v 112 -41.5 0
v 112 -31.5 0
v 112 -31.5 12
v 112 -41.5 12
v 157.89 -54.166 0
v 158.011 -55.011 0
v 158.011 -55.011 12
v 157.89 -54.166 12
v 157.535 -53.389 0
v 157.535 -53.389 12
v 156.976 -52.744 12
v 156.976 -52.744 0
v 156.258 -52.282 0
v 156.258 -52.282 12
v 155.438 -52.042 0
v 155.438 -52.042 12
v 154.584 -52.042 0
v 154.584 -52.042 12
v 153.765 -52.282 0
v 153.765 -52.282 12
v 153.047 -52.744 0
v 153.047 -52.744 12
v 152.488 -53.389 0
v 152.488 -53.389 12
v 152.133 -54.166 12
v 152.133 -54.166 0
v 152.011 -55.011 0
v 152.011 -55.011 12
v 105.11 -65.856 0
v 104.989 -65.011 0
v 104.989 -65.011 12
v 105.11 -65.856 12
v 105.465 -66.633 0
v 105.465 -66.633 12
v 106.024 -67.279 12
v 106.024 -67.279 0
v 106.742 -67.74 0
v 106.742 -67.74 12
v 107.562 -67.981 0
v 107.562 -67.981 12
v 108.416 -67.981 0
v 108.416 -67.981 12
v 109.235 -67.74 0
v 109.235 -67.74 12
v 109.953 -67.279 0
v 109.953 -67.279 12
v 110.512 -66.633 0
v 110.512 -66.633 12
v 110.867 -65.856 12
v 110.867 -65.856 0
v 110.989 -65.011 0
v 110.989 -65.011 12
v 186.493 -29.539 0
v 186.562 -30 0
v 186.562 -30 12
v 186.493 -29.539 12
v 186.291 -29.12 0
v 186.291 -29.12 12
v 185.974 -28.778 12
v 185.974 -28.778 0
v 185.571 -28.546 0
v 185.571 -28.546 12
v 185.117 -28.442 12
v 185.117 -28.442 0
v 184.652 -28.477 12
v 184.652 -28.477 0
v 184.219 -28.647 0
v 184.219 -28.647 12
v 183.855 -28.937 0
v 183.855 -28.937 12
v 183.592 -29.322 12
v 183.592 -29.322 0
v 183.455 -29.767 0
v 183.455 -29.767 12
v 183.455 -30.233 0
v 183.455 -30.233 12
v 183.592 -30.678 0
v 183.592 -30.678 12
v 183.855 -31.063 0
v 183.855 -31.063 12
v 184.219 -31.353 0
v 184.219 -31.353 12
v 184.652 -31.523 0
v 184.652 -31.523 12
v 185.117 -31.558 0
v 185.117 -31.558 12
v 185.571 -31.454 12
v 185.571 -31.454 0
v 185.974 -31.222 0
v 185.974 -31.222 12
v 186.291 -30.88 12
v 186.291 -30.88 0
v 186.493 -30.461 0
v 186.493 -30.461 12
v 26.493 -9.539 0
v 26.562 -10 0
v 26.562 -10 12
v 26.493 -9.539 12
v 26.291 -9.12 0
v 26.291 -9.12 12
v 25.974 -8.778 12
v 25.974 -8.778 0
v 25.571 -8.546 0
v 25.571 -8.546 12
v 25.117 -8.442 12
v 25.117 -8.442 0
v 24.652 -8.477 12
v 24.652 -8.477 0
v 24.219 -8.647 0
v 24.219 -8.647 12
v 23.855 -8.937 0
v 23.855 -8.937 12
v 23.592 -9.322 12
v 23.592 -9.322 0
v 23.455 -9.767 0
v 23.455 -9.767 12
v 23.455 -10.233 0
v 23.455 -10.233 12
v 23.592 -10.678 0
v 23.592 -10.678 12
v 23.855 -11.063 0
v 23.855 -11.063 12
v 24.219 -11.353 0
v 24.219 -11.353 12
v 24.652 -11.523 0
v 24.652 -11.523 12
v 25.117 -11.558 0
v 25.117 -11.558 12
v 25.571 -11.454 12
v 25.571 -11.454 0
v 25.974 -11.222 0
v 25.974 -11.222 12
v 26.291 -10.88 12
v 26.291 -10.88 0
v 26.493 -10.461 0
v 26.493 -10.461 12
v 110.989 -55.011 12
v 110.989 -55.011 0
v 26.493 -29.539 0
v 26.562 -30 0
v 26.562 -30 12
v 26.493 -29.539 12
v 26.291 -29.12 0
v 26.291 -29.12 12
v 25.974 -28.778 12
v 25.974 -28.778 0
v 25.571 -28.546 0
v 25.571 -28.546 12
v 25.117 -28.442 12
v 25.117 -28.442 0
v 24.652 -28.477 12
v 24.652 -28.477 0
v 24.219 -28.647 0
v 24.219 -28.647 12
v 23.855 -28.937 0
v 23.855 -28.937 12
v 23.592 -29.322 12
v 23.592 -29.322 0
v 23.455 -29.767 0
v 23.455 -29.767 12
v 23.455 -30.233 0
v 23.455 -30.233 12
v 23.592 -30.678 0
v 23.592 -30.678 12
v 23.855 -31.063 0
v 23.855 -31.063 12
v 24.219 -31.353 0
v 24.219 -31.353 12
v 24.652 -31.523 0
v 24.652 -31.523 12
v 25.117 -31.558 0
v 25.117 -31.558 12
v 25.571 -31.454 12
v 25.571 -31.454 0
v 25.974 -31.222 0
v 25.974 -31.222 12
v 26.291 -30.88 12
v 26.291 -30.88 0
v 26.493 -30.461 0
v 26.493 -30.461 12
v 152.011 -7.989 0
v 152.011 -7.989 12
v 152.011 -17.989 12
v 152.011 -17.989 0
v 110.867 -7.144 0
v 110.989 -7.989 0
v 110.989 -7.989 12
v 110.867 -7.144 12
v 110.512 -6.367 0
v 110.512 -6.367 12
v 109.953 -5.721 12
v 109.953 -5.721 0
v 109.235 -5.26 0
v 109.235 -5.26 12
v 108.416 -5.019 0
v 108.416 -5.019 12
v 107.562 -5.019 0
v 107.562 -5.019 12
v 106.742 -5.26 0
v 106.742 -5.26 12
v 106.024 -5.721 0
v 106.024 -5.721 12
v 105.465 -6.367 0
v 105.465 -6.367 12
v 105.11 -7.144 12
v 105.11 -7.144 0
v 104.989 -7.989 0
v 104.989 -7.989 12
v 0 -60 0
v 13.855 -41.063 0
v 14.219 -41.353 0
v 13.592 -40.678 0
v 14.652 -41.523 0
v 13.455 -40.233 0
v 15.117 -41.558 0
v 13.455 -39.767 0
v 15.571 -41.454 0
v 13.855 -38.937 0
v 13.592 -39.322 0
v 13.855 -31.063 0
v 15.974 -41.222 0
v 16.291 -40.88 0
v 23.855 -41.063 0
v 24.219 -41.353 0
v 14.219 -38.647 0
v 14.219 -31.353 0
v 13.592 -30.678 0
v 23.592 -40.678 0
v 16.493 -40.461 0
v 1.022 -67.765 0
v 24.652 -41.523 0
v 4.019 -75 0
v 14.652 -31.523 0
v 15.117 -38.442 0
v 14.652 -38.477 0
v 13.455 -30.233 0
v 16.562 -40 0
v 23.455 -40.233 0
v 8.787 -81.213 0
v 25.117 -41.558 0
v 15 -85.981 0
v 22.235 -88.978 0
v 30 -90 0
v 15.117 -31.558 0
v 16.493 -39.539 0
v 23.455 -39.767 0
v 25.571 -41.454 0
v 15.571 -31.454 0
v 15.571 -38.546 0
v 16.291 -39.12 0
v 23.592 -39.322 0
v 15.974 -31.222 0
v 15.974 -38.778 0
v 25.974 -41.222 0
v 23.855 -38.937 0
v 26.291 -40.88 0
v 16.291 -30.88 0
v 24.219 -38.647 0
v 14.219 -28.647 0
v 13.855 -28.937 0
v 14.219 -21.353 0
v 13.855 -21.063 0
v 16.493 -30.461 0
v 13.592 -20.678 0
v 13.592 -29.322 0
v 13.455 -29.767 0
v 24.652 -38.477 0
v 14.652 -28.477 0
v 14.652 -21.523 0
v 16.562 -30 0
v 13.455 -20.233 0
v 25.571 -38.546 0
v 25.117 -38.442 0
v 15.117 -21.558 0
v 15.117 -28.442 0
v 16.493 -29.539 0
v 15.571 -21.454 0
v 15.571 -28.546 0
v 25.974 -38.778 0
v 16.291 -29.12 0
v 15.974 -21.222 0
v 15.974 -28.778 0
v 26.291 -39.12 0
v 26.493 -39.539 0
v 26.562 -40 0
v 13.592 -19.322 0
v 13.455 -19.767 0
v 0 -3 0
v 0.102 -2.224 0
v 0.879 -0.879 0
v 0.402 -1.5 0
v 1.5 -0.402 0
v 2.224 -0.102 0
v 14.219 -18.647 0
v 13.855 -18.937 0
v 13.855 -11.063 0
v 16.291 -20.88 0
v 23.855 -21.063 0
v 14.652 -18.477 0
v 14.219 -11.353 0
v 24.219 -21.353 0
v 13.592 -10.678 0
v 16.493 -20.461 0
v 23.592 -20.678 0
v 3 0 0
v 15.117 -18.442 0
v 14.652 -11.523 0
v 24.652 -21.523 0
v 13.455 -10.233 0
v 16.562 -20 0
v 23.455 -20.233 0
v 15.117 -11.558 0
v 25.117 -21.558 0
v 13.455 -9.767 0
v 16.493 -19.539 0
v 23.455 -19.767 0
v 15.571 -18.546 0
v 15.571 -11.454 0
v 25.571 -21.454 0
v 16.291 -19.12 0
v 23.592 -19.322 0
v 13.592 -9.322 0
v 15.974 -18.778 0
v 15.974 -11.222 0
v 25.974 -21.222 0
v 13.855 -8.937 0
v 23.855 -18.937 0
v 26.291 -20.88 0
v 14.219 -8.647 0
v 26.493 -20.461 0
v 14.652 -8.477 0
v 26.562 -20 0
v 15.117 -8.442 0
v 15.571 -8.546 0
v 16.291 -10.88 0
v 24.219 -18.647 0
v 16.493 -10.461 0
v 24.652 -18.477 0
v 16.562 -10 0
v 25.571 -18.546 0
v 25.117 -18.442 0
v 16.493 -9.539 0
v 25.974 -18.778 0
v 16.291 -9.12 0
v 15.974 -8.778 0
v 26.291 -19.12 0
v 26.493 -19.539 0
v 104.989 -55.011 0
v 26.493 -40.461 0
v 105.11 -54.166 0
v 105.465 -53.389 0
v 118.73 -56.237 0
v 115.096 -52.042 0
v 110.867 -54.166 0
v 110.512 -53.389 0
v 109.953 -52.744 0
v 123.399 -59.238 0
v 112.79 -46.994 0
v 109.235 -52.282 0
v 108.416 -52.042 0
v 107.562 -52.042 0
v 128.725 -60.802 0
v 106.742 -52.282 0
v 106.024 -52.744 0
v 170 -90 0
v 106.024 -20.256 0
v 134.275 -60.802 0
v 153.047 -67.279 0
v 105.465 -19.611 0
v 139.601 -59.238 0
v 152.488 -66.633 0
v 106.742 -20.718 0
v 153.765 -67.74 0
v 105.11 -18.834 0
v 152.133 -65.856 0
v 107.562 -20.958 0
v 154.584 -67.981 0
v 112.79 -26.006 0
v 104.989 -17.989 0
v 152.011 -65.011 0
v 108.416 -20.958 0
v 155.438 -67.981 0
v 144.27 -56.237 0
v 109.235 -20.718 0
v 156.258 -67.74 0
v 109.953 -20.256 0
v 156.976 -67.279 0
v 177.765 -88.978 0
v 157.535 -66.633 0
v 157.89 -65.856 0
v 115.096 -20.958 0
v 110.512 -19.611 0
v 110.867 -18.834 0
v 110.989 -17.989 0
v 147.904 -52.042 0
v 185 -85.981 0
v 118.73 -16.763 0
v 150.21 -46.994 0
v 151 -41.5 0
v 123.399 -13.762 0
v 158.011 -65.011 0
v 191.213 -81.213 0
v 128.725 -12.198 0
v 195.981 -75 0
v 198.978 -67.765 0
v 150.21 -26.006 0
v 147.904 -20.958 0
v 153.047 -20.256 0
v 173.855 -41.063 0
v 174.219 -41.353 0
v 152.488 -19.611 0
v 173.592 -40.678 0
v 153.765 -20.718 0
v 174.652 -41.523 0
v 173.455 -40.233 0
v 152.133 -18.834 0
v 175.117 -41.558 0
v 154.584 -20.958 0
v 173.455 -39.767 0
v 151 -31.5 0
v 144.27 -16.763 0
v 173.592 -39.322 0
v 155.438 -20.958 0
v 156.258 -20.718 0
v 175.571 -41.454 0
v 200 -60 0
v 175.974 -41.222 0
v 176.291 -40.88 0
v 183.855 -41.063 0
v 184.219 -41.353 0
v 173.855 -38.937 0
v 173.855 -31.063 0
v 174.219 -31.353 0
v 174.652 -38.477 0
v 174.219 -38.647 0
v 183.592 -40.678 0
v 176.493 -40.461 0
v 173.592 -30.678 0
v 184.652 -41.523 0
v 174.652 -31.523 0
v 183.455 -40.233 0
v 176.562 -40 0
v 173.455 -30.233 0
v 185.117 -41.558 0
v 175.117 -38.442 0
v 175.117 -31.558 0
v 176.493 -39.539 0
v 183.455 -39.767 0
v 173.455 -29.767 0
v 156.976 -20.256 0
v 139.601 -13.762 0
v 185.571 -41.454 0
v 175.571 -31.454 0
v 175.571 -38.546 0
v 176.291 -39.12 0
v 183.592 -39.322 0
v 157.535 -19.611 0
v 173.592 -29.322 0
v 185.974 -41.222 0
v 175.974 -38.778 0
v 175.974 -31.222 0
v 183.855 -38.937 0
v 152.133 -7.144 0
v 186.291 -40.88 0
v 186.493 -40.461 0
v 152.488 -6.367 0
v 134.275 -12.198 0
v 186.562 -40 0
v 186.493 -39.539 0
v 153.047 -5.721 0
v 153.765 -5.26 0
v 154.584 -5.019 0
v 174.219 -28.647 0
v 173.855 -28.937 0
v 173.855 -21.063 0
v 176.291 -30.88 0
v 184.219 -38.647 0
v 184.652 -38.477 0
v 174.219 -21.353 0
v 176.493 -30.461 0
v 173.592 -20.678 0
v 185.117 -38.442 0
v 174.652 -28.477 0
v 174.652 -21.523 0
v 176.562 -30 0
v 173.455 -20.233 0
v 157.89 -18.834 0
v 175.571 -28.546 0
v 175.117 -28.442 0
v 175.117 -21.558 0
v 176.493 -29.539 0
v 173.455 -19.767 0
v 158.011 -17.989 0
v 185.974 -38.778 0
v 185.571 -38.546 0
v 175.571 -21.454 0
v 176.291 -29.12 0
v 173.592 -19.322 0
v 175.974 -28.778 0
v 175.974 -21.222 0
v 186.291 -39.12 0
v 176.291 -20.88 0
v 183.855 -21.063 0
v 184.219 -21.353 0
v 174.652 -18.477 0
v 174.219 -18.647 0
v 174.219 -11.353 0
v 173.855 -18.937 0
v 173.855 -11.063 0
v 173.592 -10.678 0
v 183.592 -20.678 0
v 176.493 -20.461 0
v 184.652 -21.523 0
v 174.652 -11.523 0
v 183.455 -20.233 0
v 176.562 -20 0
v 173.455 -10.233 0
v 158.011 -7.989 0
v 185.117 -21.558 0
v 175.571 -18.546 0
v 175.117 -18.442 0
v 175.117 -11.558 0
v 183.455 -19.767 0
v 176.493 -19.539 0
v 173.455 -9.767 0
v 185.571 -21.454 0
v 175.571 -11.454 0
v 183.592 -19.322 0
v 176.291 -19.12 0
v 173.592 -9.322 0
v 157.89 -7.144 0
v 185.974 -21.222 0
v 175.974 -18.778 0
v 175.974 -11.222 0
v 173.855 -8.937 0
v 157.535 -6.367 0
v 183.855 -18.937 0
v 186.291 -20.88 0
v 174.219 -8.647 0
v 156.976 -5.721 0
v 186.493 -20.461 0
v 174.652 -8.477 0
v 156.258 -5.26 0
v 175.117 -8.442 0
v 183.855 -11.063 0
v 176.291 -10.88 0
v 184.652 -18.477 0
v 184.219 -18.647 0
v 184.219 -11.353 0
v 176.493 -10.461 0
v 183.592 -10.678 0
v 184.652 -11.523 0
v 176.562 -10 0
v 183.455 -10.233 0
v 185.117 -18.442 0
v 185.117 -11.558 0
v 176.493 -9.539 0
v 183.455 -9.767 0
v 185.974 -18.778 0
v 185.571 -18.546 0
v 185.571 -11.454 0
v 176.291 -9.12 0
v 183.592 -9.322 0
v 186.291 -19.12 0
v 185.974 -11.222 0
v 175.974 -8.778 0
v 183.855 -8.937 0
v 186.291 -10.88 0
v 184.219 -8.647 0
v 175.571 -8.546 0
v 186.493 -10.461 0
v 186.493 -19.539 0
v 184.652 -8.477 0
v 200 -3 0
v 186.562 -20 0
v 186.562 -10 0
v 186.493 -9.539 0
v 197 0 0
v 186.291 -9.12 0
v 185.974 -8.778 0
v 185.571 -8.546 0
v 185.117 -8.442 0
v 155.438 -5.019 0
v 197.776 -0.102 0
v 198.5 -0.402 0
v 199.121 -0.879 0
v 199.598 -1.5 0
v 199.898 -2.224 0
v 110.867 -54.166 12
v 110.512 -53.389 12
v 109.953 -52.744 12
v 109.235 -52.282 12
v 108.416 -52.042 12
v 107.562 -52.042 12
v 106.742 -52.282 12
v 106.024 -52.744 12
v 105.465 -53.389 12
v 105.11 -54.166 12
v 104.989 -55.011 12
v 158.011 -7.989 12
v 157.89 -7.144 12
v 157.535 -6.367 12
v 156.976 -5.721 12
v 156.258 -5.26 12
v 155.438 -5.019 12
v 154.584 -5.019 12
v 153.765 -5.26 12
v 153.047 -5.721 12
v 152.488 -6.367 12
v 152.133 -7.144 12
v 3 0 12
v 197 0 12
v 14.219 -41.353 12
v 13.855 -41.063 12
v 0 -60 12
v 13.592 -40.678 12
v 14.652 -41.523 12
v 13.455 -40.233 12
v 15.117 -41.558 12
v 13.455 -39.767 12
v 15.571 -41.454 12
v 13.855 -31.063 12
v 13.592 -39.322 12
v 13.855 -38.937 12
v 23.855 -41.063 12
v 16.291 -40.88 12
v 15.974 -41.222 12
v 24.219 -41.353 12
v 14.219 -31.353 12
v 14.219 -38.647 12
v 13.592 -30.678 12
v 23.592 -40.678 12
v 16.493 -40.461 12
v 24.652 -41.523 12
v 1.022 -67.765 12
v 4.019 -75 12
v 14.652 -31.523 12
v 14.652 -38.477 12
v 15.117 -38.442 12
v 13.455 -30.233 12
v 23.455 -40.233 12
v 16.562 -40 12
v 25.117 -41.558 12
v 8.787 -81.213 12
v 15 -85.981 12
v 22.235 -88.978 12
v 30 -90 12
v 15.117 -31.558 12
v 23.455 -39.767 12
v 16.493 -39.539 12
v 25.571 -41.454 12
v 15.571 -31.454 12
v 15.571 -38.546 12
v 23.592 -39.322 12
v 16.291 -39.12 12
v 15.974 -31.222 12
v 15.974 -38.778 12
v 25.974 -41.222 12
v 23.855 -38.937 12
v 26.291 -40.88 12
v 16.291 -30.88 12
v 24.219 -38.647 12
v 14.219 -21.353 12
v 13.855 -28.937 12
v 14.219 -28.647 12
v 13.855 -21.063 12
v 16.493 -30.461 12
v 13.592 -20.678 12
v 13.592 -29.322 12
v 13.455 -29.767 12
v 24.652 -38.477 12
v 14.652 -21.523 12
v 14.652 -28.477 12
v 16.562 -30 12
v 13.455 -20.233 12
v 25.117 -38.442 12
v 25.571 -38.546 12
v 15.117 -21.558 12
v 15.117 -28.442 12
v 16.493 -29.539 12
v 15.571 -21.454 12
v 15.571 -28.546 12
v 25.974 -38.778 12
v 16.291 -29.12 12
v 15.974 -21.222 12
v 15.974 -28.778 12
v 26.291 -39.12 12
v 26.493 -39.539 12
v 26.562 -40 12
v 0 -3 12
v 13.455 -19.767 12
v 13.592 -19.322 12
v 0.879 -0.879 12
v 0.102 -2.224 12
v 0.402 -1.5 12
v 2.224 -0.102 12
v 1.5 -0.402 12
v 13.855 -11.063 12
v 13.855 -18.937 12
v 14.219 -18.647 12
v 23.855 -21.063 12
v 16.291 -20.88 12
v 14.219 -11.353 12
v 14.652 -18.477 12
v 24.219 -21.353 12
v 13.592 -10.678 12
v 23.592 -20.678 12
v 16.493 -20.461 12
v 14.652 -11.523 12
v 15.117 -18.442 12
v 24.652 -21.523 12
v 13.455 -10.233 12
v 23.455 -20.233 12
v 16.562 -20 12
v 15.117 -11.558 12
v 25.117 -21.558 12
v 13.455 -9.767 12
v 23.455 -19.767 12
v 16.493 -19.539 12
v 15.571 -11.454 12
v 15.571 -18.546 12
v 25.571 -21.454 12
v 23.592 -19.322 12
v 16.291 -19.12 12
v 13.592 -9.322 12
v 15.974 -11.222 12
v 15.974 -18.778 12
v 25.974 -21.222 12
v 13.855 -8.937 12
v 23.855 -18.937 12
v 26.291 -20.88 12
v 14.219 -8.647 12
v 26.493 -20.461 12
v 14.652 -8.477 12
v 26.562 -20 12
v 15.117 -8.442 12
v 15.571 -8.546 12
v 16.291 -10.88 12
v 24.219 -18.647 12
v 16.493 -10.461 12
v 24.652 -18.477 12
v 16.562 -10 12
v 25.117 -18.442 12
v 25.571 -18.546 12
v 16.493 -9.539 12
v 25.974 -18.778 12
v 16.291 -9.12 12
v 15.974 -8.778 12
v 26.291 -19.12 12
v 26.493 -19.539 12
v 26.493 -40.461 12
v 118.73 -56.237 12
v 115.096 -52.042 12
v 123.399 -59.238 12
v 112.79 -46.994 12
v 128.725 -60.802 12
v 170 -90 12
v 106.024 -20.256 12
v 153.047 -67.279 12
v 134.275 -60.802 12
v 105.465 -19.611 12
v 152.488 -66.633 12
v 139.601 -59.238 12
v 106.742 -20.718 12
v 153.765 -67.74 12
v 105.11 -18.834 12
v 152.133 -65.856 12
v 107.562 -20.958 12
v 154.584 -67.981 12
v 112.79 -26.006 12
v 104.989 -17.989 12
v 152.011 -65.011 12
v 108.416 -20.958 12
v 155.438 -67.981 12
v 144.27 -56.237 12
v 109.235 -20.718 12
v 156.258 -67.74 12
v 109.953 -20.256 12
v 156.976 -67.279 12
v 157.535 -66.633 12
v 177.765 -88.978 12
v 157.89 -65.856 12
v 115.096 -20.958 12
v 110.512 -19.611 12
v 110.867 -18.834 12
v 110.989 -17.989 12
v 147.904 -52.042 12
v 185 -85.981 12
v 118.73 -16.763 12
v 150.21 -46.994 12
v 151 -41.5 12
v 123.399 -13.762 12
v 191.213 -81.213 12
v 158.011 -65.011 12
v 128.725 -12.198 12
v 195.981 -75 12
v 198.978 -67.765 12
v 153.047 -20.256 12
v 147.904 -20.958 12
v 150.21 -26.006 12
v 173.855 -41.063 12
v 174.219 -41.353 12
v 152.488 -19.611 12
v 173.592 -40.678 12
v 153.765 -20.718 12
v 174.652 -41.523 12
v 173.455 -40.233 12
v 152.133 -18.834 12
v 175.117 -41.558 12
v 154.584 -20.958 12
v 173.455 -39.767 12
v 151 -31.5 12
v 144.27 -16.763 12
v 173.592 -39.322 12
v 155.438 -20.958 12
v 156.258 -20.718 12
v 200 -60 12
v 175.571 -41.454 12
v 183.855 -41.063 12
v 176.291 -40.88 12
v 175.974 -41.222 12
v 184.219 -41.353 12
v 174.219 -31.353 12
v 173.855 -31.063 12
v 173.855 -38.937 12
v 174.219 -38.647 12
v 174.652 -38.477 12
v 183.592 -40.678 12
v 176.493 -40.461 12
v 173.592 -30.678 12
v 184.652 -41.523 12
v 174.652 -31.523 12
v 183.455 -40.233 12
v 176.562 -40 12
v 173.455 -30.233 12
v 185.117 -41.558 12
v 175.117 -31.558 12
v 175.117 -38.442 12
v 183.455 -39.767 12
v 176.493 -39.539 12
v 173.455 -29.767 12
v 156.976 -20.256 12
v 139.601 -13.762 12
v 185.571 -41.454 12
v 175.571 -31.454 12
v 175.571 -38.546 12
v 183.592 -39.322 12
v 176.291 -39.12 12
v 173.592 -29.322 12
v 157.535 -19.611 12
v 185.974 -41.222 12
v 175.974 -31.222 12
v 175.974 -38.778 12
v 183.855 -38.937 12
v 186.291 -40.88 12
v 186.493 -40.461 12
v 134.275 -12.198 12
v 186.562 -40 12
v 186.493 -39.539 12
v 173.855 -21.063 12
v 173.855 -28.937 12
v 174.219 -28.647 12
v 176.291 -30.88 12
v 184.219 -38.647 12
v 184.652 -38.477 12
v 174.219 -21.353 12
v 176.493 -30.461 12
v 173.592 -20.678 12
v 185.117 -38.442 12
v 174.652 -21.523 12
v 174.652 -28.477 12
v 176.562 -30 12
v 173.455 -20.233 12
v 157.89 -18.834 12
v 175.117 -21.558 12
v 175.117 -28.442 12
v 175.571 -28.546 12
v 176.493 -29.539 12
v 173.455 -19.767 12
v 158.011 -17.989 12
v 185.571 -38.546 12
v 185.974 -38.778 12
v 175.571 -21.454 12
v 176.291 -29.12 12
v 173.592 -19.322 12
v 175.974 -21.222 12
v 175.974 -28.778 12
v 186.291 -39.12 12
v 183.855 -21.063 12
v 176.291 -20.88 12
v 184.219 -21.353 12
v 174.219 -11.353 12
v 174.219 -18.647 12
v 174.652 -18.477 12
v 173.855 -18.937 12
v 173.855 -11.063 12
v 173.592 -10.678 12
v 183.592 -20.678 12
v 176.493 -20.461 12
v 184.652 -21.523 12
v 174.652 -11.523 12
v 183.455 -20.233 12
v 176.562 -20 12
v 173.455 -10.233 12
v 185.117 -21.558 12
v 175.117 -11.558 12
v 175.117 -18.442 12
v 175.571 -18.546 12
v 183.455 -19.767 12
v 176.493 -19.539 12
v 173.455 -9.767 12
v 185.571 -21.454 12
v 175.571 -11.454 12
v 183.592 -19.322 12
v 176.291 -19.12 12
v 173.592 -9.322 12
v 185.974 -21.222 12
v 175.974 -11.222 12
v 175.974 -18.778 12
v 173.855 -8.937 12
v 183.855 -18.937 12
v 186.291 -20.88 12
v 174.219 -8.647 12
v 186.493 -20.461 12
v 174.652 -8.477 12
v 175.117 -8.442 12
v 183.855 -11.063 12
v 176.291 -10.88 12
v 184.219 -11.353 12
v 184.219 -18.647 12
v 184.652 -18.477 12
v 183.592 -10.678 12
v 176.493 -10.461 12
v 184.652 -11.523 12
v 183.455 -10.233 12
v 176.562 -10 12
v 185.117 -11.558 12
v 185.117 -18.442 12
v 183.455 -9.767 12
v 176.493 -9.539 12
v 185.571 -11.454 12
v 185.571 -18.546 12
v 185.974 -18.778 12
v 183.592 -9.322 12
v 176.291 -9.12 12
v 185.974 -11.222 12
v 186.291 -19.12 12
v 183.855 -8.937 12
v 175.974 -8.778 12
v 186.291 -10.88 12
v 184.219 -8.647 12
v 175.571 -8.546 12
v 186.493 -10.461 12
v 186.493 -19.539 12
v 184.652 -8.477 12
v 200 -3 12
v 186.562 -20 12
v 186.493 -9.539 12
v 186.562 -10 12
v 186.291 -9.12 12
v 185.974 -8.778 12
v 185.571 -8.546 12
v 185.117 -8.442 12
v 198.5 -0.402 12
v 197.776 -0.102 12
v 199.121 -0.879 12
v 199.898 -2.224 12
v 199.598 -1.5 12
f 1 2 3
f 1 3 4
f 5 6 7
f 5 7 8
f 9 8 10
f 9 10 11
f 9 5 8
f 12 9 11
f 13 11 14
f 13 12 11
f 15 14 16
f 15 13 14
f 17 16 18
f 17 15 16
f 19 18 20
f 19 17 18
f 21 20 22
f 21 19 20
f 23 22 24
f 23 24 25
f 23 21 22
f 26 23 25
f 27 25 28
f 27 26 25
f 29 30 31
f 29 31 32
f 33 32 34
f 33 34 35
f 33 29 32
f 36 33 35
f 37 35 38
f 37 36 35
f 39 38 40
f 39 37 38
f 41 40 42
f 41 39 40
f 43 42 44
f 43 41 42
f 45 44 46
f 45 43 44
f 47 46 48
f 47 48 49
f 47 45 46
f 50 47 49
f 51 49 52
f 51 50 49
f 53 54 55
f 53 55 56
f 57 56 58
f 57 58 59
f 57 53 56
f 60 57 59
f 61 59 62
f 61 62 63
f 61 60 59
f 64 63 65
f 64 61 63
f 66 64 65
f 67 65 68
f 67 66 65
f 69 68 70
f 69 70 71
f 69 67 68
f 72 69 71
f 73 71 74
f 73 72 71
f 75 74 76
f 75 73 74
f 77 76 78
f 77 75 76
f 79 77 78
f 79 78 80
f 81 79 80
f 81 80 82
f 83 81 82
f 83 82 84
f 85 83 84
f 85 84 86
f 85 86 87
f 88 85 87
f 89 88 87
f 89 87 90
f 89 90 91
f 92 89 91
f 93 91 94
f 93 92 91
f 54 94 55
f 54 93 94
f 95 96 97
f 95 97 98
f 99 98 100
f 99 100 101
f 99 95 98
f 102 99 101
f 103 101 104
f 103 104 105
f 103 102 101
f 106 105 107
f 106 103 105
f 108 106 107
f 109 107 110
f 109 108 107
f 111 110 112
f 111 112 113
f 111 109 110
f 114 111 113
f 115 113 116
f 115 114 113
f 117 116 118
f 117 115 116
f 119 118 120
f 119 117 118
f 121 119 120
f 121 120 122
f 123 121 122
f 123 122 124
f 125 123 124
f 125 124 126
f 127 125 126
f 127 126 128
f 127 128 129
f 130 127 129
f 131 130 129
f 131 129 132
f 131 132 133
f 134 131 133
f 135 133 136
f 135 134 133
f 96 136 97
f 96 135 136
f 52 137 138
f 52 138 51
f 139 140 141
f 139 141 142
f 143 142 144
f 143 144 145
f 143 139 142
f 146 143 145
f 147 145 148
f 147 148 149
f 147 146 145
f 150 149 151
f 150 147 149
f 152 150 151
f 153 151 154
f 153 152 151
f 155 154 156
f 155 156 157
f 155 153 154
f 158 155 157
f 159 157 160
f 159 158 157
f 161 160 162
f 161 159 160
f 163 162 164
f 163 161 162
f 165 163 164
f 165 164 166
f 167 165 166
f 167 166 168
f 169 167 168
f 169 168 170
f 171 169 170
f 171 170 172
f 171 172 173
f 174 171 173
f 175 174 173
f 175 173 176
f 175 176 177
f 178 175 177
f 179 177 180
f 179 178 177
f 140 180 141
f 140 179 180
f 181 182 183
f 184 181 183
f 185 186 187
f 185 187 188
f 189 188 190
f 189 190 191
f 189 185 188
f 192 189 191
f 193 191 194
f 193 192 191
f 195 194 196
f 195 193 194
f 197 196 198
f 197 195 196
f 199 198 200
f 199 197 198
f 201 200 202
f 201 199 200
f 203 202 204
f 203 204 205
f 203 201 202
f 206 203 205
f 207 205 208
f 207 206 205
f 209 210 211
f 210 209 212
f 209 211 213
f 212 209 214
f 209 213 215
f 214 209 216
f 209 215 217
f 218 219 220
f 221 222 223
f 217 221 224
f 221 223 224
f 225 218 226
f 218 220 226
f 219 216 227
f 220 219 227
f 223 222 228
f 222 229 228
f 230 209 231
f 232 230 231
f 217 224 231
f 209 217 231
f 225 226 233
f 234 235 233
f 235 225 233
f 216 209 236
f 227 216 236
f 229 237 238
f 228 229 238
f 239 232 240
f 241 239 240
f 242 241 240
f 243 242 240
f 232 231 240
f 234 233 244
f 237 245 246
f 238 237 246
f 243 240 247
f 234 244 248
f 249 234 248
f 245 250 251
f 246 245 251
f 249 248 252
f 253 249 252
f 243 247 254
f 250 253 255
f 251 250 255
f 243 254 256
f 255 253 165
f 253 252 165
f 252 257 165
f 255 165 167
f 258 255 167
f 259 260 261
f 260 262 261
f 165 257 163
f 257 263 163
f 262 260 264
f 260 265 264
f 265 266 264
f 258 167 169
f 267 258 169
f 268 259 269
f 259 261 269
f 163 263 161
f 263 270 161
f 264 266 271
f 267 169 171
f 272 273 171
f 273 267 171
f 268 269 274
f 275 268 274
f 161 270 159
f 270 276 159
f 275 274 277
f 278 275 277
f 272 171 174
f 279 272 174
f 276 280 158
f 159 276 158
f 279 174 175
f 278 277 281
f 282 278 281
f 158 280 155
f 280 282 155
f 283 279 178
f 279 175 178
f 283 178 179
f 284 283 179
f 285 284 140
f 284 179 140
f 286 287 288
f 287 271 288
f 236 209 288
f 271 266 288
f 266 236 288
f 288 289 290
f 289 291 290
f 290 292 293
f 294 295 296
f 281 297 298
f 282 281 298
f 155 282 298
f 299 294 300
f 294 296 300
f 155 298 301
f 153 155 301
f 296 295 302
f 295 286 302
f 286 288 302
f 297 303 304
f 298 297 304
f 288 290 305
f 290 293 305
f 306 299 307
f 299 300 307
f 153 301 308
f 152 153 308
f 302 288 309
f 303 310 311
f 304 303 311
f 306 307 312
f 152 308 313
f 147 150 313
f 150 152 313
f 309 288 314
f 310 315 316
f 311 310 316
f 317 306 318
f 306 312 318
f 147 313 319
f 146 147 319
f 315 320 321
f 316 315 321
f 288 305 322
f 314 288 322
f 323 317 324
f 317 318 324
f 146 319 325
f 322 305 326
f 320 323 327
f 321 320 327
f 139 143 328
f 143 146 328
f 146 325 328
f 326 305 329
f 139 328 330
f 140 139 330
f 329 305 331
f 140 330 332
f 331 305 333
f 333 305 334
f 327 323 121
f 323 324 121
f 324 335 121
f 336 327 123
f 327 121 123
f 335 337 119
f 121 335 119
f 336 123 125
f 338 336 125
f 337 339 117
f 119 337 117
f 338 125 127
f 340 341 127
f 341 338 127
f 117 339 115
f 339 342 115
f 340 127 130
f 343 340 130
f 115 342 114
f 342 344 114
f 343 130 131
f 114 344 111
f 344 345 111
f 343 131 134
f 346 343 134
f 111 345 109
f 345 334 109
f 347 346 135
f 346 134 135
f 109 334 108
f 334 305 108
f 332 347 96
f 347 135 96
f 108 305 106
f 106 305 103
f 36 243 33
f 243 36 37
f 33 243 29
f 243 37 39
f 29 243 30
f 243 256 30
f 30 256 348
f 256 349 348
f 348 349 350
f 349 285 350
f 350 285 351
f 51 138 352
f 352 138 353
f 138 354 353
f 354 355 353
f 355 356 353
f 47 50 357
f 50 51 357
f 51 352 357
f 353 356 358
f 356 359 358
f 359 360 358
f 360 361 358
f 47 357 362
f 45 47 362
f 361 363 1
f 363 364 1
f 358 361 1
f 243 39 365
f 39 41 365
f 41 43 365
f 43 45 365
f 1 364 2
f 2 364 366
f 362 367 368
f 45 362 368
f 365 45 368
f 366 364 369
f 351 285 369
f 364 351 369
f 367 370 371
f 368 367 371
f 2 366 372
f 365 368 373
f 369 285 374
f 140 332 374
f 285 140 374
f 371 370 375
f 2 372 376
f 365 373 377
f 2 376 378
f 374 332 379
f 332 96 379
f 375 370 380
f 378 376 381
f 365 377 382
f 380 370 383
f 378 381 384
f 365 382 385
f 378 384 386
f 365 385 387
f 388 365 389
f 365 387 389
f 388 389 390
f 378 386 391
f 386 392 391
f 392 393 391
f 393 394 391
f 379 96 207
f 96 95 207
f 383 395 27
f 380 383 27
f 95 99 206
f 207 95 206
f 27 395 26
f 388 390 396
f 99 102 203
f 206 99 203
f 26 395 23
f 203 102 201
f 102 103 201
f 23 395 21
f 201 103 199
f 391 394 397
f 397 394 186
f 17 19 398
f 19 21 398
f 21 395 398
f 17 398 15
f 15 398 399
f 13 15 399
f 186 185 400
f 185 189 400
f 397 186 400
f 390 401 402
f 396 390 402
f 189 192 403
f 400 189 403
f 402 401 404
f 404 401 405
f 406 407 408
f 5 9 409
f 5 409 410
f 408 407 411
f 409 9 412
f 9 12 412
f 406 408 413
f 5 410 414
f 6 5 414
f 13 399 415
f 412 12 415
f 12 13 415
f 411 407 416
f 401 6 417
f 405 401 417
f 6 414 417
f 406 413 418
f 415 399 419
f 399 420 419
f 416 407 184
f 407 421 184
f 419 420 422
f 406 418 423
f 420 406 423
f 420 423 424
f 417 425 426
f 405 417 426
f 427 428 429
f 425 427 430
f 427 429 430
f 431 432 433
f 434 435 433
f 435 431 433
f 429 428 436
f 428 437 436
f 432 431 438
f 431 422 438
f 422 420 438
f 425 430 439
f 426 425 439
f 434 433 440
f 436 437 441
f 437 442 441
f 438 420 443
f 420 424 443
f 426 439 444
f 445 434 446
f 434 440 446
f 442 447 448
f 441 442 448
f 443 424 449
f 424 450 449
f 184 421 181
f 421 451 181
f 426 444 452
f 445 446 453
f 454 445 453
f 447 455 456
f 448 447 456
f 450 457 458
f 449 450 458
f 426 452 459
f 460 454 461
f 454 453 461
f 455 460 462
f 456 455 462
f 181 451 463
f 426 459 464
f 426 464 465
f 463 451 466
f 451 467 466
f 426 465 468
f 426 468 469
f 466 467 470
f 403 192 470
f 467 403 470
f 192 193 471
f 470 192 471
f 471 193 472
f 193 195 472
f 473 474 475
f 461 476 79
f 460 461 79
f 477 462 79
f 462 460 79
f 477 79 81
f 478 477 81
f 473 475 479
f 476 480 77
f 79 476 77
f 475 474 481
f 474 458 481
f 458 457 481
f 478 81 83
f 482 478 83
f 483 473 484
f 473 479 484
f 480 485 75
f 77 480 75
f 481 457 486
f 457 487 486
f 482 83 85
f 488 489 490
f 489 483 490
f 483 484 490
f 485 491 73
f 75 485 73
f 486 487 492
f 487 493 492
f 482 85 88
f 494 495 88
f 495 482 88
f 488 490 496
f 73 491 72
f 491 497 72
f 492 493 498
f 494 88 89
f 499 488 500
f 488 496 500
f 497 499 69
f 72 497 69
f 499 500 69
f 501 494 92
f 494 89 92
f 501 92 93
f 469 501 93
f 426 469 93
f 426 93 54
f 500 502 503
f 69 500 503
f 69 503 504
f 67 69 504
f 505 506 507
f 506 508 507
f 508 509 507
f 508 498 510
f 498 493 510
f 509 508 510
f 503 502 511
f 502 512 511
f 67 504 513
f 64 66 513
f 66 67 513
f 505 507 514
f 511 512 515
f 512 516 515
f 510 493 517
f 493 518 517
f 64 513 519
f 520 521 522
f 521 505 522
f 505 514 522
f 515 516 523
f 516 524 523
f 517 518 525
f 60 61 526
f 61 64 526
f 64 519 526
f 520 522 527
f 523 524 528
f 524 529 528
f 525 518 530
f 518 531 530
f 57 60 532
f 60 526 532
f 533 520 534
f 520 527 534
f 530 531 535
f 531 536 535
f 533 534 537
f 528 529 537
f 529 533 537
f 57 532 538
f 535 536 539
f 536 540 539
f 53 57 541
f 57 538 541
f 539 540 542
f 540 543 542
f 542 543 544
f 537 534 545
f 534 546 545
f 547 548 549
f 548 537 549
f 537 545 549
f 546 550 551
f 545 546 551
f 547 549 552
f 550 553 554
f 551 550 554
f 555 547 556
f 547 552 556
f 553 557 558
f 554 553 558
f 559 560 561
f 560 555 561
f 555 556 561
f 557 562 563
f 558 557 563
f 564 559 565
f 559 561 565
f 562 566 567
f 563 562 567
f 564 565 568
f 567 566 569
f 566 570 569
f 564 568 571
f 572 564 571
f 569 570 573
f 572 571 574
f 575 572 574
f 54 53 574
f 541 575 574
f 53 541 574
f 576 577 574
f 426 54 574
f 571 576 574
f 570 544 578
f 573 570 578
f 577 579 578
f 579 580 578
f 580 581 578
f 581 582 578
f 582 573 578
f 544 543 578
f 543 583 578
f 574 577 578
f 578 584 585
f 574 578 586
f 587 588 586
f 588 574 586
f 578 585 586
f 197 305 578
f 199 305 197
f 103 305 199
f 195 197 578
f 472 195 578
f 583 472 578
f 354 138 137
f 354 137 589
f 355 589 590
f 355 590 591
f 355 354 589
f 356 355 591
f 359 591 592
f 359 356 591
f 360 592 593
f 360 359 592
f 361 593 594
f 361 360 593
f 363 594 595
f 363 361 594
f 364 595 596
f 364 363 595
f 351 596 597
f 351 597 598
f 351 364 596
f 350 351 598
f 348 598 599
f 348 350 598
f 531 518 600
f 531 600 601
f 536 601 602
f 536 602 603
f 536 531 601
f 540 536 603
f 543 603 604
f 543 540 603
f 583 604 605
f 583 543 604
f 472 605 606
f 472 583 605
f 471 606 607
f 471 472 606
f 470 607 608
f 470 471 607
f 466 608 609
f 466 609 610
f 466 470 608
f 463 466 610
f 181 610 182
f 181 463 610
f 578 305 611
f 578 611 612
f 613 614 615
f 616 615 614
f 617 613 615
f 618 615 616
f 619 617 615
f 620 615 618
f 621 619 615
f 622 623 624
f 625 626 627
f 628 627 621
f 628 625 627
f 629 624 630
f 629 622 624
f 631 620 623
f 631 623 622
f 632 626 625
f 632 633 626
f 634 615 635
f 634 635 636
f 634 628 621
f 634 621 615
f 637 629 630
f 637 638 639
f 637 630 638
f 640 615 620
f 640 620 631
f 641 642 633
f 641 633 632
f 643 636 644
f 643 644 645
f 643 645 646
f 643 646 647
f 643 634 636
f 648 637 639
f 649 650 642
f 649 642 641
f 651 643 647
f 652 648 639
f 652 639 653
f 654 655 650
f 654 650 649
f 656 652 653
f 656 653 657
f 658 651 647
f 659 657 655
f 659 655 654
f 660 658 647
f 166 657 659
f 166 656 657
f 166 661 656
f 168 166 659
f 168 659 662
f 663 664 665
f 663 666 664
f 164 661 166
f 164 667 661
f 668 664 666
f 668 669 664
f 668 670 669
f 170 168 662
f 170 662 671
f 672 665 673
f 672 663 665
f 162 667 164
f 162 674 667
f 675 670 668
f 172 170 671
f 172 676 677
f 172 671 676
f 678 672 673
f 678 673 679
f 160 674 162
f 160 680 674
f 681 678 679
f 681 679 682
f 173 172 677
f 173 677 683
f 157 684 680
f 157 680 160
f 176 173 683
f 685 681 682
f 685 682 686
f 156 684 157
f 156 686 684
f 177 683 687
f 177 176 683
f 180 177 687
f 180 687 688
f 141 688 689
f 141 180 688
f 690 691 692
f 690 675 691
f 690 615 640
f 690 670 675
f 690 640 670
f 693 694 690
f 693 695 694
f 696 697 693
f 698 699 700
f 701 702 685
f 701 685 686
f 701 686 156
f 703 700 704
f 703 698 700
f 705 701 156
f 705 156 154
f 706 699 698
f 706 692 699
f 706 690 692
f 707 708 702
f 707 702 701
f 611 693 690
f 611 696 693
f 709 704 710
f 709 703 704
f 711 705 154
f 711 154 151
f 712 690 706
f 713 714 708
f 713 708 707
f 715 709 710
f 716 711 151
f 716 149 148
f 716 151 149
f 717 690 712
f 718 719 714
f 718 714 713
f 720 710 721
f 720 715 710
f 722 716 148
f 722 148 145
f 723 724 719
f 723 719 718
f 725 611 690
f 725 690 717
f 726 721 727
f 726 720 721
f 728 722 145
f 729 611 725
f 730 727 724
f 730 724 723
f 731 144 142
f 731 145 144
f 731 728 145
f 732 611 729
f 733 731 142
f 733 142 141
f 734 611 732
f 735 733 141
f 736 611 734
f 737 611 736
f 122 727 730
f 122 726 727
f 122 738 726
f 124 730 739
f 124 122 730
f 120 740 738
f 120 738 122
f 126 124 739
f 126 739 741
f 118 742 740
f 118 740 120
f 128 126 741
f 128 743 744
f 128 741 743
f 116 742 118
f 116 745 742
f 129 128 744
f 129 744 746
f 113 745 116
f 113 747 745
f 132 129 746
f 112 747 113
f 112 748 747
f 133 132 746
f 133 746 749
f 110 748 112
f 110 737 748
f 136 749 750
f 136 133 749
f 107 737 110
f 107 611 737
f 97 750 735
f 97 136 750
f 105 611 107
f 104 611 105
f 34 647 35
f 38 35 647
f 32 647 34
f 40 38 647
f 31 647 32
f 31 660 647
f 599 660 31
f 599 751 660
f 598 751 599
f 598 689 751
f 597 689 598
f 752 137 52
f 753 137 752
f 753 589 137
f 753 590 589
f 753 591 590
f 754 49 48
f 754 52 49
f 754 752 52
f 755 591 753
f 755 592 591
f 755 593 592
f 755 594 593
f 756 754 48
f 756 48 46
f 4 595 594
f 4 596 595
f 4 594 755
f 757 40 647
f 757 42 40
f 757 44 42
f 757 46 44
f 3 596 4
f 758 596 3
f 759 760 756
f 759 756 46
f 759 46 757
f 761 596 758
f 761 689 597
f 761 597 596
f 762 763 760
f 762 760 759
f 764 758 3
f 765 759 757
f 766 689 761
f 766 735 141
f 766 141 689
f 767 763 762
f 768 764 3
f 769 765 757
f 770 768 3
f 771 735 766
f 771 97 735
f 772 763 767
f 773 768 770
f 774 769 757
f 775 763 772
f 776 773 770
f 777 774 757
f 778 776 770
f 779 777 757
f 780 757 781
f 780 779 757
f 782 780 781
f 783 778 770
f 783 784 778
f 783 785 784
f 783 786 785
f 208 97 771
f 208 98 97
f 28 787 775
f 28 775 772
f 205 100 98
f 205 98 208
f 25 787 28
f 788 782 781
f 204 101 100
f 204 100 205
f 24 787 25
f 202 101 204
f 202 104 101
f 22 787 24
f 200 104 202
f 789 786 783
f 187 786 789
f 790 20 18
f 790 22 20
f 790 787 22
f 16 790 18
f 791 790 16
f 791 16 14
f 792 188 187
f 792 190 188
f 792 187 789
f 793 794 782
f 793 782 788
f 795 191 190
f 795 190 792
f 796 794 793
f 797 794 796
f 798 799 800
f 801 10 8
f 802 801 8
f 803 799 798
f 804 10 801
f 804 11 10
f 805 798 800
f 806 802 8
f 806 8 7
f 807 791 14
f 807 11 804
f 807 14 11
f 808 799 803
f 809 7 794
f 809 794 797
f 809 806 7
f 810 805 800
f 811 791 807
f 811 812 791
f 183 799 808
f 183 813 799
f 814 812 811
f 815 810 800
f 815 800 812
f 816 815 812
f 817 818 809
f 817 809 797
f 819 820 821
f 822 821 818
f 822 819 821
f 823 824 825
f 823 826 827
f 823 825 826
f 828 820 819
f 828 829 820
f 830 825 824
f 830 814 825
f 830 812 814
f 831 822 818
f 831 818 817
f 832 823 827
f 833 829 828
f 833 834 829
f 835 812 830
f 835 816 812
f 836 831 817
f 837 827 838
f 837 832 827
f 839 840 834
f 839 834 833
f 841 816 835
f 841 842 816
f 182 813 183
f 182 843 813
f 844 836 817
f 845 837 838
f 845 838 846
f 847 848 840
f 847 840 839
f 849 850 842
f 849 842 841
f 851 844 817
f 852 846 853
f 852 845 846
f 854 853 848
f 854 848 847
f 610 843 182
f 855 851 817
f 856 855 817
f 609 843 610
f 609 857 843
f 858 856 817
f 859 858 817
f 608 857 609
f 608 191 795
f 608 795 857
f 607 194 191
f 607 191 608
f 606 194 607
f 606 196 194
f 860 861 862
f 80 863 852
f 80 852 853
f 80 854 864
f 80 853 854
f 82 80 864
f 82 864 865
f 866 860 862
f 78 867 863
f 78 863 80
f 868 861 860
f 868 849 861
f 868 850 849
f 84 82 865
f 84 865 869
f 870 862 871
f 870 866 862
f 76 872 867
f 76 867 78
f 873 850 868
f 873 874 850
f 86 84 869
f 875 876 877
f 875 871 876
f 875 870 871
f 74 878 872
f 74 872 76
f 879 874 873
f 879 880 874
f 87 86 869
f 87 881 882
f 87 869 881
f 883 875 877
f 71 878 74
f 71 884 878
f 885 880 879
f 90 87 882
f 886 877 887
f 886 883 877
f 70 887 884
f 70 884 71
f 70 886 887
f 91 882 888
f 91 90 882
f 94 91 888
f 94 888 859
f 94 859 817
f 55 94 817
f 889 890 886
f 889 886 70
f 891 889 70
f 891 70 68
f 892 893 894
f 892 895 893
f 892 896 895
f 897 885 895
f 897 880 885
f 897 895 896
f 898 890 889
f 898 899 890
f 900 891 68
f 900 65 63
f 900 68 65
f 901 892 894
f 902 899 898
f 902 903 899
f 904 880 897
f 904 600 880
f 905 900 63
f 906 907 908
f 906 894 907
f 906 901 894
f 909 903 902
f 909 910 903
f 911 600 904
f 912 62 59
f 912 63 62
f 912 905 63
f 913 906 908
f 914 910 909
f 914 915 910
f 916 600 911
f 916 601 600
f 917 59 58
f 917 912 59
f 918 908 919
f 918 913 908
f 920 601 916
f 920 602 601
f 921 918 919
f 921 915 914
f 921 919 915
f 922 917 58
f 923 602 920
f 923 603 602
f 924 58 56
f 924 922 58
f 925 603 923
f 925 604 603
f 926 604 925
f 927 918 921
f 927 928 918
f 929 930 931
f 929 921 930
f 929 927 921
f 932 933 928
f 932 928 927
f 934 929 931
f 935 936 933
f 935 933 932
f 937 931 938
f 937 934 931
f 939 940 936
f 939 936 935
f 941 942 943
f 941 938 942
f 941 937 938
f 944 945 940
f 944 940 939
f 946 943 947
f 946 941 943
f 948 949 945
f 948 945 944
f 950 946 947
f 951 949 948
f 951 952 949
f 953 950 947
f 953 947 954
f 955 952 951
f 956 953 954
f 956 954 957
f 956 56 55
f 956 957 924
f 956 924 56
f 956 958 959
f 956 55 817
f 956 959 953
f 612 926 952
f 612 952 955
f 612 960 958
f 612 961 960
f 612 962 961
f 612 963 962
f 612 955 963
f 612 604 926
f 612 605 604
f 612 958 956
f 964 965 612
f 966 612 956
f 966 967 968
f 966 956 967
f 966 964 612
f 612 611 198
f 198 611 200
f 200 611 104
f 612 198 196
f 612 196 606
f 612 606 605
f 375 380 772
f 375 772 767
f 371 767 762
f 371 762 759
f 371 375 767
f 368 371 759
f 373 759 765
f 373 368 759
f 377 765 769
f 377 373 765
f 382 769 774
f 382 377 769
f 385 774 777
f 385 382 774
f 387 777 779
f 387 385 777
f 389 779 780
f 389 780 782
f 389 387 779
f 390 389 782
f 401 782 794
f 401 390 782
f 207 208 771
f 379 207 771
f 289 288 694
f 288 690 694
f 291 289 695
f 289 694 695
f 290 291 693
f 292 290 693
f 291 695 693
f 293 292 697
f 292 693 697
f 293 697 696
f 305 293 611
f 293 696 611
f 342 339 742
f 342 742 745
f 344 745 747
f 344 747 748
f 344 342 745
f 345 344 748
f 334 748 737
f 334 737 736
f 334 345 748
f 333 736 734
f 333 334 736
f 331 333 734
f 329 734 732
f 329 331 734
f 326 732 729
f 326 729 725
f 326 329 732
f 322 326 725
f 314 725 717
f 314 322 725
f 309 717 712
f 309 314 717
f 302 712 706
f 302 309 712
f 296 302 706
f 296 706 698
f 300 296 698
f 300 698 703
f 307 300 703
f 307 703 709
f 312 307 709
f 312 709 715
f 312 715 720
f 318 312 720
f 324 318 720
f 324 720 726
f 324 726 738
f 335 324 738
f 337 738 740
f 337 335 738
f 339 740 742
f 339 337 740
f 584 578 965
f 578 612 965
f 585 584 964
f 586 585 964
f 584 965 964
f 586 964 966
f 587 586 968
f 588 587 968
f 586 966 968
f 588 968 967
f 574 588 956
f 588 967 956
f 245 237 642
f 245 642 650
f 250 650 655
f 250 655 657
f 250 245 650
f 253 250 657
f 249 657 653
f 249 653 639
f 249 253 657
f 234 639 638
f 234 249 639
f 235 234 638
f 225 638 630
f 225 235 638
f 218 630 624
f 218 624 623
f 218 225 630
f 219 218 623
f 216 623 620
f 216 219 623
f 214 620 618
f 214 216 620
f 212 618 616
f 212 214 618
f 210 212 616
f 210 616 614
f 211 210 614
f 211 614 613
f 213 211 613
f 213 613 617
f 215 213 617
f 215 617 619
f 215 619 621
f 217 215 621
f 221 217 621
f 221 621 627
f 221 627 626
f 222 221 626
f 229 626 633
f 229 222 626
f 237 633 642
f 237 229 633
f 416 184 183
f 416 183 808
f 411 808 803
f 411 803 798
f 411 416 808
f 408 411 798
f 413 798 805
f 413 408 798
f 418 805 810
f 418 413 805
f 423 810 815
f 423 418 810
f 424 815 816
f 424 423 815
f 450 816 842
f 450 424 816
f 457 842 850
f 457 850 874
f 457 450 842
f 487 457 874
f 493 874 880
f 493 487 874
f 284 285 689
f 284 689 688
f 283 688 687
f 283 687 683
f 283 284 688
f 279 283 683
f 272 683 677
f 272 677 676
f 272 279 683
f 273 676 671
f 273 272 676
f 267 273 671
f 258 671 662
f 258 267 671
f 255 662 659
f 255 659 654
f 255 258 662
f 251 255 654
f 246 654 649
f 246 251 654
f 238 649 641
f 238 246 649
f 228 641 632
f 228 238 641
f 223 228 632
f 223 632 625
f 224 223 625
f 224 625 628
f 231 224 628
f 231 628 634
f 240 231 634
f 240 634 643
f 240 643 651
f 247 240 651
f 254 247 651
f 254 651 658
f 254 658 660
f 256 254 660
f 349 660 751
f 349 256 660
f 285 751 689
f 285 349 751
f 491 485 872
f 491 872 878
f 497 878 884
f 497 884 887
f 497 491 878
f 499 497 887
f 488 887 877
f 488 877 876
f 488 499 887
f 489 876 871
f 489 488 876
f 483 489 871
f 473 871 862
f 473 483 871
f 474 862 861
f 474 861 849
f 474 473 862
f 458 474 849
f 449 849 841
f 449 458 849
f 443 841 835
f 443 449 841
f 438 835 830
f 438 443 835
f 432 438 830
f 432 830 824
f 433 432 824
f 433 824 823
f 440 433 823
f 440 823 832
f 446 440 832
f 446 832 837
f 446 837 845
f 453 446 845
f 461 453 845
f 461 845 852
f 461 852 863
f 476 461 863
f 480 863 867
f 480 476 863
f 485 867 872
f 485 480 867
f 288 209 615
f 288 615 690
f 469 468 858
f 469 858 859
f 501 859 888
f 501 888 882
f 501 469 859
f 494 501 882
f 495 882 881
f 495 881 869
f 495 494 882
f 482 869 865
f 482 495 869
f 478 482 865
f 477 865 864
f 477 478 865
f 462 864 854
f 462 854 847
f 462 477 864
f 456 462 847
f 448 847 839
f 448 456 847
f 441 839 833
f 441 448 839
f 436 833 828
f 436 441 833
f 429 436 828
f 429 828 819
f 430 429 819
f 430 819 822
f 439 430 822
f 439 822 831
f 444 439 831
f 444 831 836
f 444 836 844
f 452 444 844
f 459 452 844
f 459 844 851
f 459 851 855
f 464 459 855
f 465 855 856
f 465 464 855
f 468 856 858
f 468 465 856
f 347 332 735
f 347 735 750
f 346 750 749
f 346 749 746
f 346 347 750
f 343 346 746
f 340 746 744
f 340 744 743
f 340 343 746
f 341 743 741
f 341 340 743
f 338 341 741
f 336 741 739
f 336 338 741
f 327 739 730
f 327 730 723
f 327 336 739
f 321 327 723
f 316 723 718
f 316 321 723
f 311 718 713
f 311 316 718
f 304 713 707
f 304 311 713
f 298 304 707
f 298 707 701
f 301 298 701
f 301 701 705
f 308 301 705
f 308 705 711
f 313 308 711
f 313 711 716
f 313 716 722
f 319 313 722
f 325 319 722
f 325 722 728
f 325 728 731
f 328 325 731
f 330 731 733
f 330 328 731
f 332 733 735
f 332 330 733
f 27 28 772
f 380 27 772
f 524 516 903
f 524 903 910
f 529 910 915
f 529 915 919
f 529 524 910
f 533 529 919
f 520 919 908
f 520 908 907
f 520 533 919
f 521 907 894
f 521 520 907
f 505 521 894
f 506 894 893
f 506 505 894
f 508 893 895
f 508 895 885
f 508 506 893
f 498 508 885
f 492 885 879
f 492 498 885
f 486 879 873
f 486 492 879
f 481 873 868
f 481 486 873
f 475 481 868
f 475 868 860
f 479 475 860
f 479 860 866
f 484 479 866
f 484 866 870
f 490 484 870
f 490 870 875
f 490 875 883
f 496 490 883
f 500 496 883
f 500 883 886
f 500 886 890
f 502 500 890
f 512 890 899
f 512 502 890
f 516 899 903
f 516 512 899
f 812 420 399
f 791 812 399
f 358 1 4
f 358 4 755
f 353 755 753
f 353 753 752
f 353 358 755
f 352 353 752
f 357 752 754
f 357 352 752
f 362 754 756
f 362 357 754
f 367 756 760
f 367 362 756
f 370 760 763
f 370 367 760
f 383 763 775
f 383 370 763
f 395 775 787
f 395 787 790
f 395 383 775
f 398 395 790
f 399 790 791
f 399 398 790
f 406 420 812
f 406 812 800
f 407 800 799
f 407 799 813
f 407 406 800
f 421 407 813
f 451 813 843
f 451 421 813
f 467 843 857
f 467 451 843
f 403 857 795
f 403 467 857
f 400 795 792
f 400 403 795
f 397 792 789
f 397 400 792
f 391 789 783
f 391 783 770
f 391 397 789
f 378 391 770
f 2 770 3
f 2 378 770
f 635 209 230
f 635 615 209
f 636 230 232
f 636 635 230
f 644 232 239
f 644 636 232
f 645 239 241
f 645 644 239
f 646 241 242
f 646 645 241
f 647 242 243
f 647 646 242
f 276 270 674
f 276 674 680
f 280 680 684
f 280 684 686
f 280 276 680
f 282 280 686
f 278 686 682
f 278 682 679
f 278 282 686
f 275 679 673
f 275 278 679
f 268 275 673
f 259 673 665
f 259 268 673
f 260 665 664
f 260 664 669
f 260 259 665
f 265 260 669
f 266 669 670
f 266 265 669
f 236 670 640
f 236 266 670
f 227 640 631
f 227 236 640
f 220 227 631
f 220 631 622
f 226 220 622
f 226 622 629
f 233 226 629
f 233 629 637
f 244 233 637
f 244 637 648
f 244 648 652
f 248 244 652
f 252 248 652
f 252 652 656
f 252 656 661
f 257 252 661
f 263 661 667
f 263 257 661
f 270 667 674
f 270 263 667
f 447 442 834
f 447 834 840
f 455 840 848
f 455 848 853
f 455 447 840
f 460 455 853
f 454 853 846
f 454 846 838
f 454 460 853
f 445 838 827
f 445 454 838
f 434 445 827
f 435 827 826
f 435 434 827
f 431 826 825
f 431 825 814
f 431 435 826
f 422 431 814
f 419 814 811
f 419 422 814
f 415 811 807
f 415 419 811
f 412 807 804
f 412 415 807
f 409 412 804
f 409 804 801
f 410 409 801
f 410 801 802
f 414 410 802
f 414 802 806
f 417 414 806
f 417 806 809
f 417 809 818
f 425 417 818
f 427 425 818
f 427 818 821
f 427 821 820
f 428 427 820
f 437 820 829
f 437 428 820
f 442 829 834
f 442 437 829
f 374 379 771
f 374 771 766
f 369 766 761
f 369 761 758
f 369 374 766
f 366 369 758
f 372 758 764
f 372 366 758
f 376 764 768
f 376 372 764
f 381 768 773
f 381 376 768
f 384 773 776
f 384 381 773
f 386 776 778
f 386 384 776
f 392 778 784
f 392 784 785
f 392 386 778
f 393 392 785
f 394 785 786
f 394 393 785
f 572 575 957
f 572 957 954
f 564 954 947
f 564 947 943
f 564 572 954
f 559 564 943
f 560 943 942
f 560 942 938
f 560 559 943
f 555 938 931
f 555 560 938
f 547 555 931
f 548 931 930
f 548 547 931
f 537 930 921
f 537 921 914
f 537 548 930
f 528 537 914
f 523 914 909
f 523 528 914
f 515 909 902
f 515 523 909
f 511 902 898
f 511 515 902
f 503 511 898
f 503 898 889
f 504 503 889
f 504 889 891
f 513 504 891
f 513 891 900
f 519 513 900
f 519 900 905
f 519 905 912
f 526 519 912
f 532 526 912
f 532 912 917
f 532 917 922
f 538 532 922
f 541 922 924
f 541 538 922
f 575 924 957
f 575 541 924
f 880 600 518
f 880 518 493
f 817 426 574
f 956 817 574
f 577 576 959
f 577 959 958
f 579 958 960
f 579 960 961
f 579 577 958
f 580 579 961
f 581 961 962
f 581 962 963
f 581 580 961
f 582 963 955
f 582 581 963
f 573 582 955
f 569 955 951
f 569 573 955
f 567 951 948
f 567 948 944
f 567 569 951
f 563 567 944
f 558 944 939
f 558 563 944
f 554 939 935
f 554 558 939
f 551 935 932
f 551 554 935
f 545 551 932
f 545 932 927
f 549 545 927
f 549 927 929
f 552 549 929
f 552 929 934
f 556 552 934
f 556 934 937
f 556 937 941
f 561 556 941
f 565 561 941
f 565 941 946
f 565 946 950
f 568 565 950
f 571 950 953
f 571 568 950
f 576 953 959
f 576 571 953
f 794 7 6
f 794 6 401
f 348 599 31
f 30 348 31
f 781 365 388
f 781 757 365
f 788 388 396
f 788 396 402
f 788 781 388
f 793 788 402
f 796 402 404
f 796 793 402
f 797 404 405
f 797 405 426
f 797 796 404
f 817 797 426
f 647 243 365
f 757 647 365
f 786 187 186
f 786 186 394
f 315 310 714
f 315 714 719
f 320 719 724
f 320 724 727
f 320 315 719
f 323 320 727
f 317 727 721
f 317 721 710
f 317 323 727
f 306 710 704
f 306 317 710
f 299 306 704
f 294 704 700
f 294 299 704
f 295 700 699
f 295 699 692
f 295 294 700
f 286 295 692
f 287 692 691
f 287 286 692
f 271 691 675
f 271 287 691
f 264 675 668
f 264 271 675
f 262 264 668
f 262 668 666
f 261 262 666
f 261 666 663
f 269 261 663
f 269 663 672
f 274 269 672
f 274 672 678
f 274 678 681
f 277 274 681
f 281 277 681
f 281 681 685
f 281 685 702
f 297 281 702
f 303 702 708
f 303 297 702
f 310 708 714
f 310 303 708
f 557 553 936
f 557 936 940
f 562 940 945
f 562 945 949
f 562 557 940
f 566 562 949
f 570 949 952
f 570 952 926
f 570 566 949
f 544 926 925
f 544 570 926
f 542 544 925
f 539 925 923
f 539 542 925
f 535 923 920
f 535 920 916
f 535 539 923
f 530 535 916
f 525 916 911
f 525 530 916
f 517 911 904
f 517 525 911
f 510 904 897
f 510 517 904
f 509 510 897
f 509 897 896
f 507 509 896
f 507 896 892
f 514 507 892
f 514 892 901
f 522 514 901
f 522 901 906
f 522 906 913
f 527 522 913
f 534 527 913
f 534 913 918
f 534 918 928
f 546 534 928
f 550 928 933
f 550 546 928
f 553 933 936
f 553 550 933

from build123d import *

# Parameters (mm, degrees)
SKETCH_W    = 200
SKETCH_H    = 90
SKETCH_R    = 1.5625
PAD_DEPTH   = 12
FILLET_R    = 30
FILLET001_R = 3


with BuildPart() as part:
    # Sketch → Pad (new body)
    with BuildSketch(Plane.XY):
        with Locations((100, -45)):
            Rectangle(SKETCH_W, SKETCH_H)
        with Locations((175, -10)):
            Circle(SKETCH_R, mode=Mode.SUBTRACT)
        with Locations((175, -30)):
            Circle(SKETCH_R, mode=Mode.SUBTRACT)
        with Locations((185, -20)):
            Circle(SKETCH_R, mode=Mode.SUBTRACT)
        with Locations((185, -40)):
            Circle(SKETCH_R, mode=Mode.SUBTRACT)
        with Locations((25, -10)):
            Circle(SKETCH_R, mode=Mode.SUBTRACT)
        with Locations((25, -30)):
            Circle(SKETCH_R, mode=Mode.SUBTRACT)
        with Locations((15, -20)):
            Circle(SKETCH_R, mode=Mode.SUBTRACT)
        with Locations((15, -40)):
            Circle(SKETCH_R, mode=Mode.SUBTRACT)
        with Locations((185, -10)):
            Circle(SKETCH_R, mode=Mode.SUBTRACT)
        with Locations((175, -20)):
            Circle(SKETCH_R, mode=Mode.SUBTRACT)
        with Locations((185, -30)):
            Circle(SKETCH_R, mode=Mode.SUBTRACT)
        with Locations((175, -40)):
            Circle(SKETCH_R, mode=Mode.SUBTRACT)
        with Locations((15, -10)):
            Circle(SKETCH_R, mode=Mode.SUBTRACT)
        with Locations((25, -20)):
            Circle(SKETCH_R, mode=Mode.SUBTRACT)
        with Locations((15, -30)):
            Circle(SKETCH_R, mode=Mode.SUBTRACT)
        with Locations((25, -40)):
            Circle(SKETCH_R, mode=Mode.SUBTRACT)
        with BuildLine():
            ThreePointArc((158.0113, -7.9887), (155.0113, -4.9887), (152.0113, -7.9887))
            Line((152.0113, -7.9887), (152.0113, -17.9887))
            ThreePointArc((152.0113, -17.9887), (155.0113, -20.9887), (158.0113, -17.9887))
            Line((158.0113, -7.9887), (158.0113, -17.9887))
        make_face(mode=Mode.SUBTRACT)
        with BuildLine():
            ThreePointArc((151, -31.5), (131.5, -12), (112, -31.5))
            Line((112, -31.5), (112, -41.5))
            ThreePointArc((112, -41.5), (131.5, -61), (151, -41.5))
            Line((151, -31.5), (151, -41.5))
        make_face(mode=Mode.SUBTRACT)
        with BuildLine():
            ThreePointArc((158.0113, -55.0113), (155.0113, -52.0113), (152.0113, -55.0113))
            Line((152.0113, -55.0113), (152.0113, -65.0113))
            ThreePointArc((152.0113, -65.0113), (155.0113, -68.0113), (158.0113, -65.0113))
            Line((158.0113, -55.0113), (158.0113, -65.0113))
        make_face(mode=Mode.SUBTRACT)
        with BuildLine():
            ThreePointArc((110.9887, -55.0113), (107.9887, -52.0113), (104.9887, -55.0113))
            Line((104.9887, -55.0113), (104.9887, -65.0113))
            ThreePointArc((104.9887, -65.0113), (107.9887, -68.0113), (110.9887, -65.0113))
            Line((110.9887, -55.0113), (110.9887, -65.0113))
        make_face(mode=Mode.SUBTRACT)
        with BuildLine():
            ThreePointArc((110.9887, -7.9887), (107.9887, -4.9887), (104.9887, -7.9887))
            Line((104.9887, -7.9887), (104.9887, -17.9887))
            ThreePointArc((104.9887, -17.9887), (107.9887, -20.9887), (110.9887, -17.9887))
            Line((110.9887, -7.9887), (110.9887, -17.9887))
        make_face(mode=Mode.SUBTRACT)
    extrude(amount=PAD_DEPTH)

    # Fillet
    fillet_edges = [part.edges().sort_by_distance(p)[0] for p in [
        (0, -90, 6),
        (200, -90, 6),
    ]]
    fillet(fillet_edges, radius=FILLET_R)

    # Fillet001
    fillet001_edges = [part.edges().sort_by_distance(p)[0] for p in [
        (200, 0, 6),
        (0, 0, 6),
    ]]
    fillet(fillet001_edges, radius=FILLET001_R)


solid = part.part
